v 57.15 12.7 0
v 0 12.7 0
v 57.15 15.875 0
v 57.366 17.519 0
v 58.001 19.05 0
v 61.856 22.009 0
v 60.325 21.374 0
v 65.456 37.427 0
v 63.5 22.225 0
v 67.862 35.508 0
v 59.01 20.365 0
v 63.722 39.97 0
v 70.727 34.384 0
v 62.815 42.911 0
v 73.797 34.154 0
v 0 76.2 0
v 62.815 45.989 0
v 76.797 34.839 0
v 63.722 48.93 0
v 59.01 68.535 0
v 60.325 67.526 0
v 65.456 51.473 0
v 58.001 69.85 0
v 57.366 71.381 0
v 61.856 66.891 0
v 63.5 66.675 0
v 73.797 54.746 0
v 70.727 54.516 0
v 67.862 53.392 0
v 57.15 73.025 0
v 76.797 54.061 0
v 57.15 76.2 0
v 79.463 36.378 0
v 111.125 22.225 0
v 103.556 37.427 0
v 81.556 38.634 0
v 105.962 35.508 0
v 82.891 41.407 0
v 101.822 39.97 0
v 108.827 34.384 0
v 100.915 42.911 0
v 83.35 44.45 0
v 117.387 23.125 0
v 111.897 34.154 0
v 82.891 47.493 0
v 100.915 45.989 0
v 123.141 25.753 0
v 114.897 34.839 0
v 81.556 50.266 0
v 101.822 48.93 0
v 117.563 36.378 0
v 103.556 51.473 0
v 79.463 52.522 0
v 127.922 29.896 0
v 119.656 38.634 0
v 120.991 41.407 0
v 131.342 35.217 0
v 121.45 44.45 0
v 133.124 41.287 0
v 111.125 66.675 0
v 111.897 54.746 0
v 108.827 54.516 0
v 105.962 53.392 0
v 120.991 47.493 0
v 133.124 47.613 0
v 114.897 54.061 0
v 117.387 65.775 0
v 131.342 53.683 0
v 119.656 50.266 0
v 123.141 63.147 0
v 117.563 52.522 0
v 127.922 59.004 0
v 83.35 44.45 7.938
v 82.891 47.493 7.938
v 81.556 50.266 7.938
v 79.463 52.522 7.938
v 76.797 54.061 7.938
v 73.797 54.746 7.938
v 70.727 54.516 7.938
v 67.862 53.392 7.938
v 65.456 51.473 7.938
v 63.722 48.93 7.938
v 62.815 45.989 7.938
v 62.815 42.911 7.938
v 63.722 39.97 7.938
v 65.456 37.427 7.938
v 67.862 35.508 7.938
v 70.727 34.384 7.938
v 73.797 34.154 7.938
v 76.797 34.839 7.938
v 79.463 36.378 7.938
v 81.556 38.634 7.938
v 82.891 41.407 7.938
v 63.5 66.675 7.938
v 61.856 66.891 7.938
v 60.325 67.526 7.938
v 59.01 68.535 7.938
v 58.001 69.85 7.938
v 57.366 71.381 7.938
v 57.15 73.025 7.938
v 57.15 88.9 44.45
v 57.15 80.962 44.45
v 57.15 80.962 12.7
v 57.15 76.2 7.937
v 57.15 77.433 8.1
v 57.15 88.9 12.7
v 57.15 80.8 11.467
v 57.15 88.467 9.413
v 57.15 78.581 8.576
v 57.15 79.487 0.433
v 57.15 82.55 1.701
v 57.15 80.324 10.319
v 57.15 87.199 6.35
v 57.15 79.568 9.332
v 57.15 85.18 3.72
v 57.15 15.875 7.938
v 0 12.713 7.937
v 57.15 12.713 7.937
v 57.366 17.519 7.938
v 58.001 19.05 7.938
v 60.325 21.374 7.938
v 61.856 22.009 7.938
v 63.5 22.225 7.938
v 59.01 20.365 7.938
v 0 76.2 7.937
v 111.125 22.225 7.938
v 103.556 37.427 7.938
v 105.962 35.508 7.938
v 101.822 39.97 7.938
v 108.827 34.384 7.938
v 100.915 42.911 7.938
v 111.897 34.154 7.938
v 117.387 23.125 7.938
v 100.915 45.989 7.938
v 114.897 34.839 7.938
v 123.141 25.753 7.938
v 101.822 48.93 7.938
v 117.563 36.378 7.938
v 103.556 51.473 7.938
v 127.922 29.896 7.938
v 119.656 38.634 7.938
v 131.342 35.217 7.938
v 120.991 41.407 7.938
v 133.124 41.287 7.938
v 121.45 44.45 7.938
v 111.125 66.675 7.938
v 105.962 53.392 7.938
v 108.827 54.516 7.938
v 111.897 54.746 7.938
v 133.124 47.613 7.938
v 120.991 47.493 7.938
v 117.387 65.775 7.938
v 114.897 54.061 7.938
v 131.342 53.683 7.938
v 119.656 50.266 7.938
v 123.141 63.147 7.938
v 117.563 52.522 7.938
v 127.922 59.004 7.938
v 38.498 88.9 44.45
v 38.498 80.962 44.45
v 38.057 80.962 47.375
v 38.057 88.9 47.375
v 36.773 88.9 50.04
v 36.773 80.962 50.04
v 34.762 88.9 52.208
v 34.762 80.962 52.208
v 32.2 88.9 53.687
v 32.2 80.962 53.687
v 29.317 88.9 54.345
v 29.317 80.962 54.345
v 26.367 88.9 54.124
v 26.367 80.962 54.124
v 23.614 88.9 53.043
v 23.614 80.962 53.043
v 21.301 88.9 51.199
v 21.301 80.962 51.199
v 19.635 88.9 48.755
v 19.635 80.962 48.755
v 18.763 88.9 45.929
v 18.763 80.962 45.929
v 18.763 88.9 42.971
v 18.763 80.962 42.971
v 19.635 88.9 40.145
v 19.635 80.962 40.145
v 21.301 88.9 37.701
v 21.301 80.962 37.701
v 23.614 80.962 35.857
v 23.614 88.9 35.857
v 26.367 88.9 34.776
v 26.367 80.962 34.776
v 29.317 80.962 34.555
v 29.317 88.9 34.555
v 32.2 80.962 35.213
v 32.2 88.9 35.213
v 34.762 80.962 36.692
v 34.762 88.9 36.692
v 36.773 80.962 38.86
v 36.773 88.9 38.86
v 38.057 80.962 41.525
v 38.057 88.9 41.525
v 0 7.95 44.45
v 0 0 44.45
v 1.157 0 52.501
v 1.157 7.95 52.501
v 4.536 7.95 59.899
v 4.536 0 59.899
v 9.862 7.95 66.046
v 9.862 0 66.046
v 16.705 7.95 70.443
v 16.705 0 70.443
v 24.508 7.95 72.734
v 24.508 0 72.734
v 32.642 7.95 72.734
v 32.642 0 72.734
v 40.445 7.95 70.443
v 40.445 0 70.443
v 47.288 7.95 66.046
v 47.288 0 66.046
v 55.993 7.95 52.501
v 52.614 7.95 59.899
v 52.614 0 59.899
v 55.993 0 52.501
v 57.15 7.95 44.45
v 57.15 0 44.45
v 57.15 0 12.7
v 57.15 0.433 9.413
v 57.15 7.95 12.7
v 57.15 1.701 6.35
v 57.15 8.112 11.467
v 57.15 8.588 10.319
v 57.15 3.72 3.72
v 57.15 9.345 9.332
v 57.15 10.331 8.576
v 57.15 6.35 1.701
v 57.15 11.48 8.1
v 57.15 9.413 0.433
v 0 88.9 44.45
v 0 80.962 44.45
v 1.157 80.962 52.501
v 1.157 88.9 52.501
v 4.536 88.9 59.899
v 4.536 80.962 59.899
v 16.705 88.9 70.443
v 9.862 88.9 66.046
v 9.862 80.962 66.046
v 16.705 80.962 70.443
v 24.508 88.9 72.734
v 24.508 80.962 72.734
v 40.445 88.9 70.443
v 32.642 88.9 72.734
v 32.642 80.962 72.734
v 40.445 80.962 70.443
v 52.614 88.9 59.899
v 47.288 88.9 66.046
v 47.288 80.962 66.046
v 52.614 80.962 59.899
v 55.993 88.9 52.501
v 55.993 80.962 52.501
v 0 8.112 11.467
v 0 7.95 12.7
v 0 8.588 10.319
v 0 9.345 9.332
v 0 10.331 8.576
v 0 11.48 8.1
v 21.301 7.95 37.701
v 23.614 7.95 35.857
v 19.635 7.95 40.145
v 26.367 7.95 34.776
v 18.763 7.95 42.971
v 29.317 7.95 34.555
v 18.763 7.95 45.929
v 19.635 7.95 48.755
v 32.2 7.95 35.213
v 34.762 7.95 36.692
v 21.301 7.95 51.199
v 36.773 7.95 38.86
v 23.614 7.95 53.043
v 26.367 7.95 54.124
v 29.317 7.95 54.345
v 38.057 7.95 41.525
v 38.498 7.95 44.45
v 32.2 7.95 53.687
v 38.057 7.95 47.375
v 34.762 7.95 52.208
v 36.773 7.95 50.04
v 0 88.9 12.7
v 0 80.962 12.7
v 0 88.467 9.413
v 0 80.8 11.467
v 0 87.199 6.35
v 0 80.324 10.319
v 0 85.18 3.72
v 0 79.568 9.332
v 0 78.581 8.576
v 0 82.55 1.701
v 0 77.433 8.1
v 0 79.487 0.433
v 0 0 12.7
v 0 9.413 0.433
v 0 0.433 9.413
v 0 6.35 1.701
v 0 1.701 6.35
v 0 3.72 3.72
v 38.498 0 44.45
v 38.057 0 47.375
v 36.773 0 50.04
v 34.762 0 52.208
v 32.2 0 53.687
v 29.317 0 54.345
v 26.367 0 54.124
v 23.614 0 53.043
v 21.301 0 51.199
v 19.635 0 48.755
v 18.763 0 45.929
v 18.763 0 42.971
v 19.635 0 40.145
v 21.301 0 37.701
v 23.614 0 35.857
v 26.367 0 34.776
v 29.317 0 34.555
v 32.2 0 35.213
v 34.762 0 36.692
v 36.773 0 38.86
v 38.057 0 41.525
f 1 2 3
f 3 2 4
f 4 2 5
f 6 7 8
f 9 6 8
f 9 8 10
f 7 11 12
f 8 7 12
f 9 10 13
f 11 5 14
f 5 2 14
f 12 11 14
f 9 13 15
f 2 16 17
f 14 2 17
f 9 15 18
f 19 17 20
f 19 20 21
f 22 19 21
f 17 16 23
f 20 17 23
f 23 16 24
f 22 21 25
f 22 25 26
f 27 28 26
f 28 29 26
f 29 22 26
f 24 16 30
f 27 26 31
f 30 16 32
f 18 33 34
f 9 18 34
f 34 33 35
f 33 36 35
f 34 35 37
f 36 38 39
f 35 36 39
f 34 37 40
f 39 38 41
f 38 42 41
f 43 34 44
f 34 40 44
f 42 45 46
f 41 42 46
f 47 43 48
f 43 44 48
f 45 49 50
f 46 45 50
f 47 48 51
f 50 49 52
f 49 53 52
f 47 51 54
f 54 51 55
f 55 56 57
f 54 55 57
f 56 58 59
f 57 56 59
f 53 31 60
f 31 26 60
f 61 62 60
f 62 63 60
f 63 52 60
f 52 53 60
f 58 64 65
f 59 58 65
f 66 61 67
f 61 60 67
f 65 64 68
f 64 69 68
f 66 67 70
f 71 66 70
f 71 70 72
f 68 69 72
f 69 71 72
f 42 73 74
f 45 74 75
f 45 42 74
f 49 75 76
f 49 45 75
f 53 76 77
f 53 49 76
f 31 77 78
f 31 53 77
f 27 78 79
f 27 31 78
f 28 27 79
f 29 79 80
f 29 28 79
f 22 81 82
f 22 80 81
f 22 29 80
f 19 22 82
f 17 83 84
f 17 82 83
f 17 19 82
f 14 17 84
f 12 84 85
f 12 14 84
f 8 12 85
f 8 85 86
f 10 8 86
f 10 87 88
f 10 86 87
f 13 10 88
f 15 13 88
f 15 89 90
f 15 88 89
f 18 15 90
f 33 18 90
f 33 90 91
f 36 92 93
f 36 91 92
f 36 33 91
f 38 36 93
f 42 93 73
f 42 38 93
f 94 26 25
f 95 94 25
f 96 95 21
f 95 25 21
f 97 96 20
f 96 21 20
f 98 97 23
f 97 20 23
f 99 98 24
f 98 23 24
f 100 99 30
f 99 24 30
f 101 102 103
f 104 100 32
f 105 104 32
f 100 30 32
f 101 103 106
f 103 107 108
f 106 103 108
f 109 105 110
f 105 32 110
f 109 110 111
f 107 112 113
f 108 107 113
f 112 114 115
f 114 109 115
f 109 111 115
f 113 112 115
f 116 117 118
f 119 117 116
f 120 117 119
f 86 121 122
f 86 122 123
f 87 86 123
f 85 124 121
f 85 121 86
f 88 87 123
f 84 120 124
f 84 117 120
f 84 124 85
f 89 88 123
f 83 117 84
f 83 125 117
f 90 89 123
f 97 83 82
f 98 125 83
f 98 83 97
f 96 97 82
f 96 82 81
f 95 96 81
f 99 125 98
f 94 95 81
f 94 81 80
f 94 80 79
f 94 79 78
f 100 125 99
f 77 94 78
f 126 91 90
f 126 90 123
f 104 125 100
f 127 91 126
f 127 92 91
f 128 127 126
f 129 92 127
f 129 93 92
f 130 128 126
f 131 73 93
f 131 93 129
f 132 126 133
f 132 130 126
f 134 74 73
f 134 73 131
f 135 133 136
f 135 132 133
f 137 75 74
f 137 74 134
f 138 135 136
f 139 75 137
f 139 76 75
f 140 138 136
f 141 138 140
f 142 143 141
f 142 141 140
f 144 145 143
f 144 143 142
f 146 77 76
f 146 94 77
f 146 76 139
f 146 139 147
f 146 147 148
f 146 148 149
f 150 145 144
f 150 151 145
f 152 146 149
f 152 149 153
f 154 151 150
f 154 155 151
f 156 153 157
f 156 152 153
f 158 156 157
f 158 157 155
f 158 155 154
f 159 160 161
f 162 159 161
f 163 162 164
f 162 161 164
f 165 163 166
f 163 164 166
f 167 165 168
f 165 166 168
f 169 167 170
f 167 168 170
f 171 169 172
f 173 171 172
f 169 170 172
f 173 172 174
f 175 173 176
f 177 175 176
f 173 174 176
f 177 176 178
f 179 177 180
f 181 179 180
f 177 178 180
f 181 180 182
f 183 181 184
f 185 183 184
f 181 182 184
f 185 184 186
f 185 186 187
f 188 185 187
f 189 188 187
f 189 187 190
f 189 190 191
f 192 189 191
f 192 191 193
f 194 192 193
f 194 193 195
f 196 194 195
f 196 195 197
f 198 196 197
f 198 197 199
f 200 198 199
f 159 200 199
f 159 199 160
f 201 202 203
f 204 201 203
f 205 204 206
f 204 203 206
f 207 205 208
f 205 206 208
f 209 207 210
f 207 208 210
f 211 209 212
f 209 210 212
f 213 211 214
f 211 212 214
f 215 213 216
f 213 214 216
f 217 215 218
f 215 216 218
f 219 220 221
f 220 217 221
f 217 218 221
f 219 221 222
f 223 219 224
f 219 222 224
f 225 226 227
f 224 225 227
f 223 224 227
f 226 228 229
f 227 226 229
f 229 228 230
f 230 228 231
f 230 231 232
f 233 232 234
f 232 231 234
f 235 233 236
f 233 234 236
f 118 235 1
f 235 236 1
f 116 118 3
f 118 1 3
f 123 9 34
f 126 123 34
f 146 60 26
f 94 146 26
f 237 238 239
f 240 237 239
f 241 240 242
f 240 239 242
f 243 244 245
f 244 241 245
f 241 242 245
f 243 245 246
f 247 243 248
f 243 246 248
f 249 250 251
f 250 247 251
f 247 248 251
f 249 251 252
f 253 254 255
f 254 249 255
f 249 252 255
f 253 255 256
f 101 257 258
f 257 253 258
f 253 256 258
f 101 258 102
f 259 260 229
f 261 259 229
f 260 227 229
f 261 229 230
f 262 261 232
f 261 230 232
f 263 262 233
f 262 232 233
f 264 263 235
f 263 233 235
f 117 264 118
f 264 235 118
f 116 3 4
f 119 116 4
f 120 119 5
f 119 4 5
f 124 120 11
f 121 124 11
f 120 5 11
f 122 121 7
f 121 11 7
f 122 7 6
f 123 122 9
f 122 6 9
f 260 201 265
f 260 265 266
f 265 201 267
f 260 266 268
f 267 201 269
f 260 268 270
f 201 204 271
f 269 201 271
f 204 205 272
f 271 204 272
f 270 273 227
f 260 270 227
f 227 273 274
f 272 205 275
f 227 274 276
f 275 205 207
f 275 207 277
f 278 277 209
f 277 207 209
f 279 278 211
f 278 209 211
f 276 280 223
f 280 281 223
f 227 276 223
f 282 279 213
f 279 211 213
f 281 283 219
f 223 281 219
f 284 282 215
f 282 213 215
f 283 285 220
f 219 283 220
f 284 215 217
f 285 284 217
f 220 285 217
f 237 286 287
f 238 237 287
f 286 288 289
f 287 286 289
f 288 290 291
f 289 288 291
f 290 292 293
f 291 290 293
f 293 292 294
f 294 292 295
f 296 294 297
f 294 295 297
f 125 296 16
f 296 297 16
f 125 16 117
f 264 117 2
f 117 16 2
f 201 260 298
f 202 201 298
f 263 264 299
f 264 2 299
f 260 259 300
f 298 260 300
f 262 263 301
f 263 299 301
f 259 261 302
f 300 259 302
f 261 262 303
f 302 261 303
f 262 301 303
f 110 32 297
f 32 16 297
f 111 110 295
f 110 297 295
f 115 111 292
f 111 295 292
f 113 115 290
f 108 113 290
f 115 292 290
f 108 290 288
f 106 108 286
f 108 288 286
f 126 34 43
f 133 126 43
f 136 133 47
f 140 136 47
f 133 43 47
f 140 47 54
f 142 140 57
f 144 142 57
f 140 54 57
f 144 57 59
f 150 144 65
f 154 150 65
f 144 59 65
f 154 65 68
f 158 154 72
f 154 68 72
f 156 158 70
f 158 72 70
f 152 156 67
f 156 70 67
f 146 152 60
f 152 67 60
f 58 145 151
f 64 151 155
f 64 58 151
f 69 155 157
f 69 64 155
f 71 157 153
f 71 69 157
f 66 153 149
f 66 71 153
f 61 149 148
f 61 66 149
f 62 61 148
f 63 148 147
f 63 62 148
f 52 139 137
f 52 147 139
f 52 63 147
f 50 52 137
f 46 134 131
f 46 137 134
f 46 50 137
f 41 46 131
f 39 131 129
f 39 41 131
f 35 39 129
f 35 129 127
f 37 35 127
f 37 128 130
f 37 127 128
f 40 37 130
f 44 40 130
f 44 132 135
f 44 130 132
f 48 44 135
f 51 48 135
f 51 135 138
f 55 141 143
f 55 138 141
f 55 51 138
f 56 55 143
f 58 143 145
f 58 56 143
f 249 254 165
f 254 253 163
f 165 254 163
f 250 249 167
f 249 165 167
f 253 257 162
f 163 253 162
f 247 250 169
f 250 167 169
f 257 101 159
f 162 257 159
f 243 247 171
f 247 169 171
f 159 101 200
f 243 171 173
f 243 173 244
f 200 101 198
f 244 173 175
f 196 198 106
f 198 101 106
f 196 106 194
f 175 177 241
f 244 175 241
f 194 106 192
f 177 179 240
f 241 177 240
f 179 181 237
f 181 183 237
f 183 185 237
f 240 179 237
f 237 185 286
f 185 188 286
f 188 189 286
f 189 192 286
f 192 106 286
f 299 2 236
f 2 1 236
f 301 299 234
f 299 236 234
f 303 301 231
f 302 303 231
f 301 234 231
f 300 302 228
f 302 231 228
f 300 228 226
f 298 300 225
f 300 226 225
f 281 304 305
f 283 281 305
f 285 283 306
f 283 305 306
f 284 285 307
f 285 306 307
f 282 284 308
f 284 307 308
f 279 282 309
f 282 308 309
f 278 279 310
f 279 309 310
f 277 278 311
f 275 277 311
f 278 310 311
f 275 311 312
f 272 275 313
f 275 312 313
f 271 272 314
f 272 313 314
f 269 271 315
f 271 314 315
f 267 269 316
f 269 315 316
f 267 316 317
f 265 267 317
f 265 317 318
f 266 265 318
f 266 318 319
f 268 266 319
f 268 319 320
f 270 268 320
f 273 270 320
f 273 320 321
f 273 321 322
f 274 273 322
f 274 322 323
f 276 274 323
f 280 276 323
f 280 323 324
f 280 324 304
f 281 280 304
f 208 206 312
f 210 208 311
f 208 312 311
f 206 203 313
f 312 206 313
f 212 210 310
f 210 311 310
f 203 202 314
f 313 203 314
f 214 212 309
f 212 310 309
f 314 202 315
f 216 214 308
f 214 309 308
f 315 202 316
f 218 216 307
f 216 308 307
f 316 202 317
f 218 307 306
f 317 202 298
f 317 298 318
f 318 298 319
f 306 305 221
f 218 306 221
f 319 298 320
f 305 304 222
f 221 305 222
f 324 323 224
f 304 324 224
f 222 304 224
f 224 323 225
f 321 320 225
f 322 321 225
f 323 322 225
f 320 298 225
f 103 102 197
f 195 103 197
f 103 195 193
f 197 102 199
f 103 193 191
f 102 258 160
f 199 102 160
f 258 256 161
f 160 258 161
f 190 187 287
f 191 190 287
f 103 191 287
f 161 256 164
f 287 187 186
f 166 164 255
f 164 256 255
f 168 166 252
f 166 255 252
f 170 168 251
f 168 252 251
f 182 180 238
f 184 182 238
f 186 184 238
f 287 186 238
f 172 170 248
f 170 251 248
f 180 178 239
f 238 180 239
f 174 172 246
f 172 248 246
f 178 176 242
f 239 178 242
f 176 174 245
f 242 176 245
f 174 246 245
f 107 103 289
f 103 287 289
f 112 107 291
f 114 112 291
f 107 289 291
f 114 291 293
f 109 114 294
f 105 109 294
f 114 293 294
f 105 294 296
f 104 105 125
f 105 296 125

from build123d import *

# Parameters (mm, degrees)
F0_R     = 10.3251
F1_DEPTH = 76.2
F3_DEPTH = 68.2625
F4_R     = 9.92251
F5_DEPTH = 88.901
F6_R     = 12.7
F7_R     = 4.7625


with BuildPart() as f1:
    # F0 (on Top) → F1 (new body)
    with BuildSketch(Plane.XY):
        with BuildLine():
            Line((0, 88.9), (0, 0))
            Line((0, 0), (57.15, 0))
            Line((57.15, 0), (57.15, 15.875))
            ThreePointArc((57.15, 15.875), (59.009872, 20.365128), (63.5, 22.225))
            Line((63.5, 22.225), (111.125, 22.225))
            ThreePointArc((111.125, 22.225), (133.35, 44.45), (111.125, 66.675))
            Line((111.125, 66.675), (63.5, 66.675))
            ThreePointArc((63.5, 66.675), (59.009872, 68.534872), (57.15, 73.025))
            Line((57.15, 73.025), (57.15, 88.9))
            Line((57.15, 88.9), (0, 88.9))
        make_face()
        with Locations((73.025, 44.45)):
            Circle(F0_R, mode=Mode.SUBTRACT)
        with Locations((111.125, 44.45)):
            Circle(F0_R, mode=Mode.SUBTRACT)
    extrude(amount=F1_DEPTH)

    # F2 (on face) → F3 (cut)
    with BuildSketch(Plane.XY.offset(76.2)):
        with BuildLine():
            ThreePointArc((57.15, 15.875), (59.009872, 20.365128), (63.5, 22.225))
            Line((63.5, 22.225), (111.125, 22.225))
            ThreePointArc((111.125, 22.225), (133.35, 44.45), (111.125, 66.675))
            Line((111.125, 66.675), (63.5, 66.675))
            ThreePointArc((63.5, 66.675), (59.009872, 68.534872), (57.15, 73.025))
            Line((57.15, 73.025), (57.15, 80.9625))
            Line((57.15, 80.9625), (0, 80.9625))
            Line((0, 80.9625), (0, 7.9502))
            Line((0, 7.9502), (57.15, 7.9502))
            Line((57.15, 7.9502), (57.15, 15.875))
        make_face()
    extrude(amount=-F3_DEPTH, mode=Mode.SUBTRACT)

    # F4 (on face) → F5 (cut, through all)
    with BuildSketch(Plane.XZ):
        with Locations((28.575, 44.45)):
            Circle(F4_R)
        with BuildLine():
            Line((0, 76.2), (0, 44.45))
            ThreePointArc((0, 44.45), (28.575, 73.025), (57.15, 44.45))
            Line((57.15, 44.45), (57.15, 76.2))
            Line((57.15, 76.2), (0, 76.2))
        make_face()
    extrude(amount=-F5_DEPTH, mode=Mode.SUBTRACT)

    # F6
    f6_edges = [f1.edges().sort_by_distance(p)[0] for p in [
        (28.575, 0, 0),
        (28.575, 88.9, 0),
    ]]
    fillet(f6_edges, radius=F6_R)

    # F7
    f7_edges = [f1.edges().sort_by_distance(p)[0] for p in [
        (28.575, 7.9502, 7.9375),
        (28.575, 80.9625, 7.9375),
    ]]
    fillet(f7_edges, radius=F7_R)


solid = f1.part
